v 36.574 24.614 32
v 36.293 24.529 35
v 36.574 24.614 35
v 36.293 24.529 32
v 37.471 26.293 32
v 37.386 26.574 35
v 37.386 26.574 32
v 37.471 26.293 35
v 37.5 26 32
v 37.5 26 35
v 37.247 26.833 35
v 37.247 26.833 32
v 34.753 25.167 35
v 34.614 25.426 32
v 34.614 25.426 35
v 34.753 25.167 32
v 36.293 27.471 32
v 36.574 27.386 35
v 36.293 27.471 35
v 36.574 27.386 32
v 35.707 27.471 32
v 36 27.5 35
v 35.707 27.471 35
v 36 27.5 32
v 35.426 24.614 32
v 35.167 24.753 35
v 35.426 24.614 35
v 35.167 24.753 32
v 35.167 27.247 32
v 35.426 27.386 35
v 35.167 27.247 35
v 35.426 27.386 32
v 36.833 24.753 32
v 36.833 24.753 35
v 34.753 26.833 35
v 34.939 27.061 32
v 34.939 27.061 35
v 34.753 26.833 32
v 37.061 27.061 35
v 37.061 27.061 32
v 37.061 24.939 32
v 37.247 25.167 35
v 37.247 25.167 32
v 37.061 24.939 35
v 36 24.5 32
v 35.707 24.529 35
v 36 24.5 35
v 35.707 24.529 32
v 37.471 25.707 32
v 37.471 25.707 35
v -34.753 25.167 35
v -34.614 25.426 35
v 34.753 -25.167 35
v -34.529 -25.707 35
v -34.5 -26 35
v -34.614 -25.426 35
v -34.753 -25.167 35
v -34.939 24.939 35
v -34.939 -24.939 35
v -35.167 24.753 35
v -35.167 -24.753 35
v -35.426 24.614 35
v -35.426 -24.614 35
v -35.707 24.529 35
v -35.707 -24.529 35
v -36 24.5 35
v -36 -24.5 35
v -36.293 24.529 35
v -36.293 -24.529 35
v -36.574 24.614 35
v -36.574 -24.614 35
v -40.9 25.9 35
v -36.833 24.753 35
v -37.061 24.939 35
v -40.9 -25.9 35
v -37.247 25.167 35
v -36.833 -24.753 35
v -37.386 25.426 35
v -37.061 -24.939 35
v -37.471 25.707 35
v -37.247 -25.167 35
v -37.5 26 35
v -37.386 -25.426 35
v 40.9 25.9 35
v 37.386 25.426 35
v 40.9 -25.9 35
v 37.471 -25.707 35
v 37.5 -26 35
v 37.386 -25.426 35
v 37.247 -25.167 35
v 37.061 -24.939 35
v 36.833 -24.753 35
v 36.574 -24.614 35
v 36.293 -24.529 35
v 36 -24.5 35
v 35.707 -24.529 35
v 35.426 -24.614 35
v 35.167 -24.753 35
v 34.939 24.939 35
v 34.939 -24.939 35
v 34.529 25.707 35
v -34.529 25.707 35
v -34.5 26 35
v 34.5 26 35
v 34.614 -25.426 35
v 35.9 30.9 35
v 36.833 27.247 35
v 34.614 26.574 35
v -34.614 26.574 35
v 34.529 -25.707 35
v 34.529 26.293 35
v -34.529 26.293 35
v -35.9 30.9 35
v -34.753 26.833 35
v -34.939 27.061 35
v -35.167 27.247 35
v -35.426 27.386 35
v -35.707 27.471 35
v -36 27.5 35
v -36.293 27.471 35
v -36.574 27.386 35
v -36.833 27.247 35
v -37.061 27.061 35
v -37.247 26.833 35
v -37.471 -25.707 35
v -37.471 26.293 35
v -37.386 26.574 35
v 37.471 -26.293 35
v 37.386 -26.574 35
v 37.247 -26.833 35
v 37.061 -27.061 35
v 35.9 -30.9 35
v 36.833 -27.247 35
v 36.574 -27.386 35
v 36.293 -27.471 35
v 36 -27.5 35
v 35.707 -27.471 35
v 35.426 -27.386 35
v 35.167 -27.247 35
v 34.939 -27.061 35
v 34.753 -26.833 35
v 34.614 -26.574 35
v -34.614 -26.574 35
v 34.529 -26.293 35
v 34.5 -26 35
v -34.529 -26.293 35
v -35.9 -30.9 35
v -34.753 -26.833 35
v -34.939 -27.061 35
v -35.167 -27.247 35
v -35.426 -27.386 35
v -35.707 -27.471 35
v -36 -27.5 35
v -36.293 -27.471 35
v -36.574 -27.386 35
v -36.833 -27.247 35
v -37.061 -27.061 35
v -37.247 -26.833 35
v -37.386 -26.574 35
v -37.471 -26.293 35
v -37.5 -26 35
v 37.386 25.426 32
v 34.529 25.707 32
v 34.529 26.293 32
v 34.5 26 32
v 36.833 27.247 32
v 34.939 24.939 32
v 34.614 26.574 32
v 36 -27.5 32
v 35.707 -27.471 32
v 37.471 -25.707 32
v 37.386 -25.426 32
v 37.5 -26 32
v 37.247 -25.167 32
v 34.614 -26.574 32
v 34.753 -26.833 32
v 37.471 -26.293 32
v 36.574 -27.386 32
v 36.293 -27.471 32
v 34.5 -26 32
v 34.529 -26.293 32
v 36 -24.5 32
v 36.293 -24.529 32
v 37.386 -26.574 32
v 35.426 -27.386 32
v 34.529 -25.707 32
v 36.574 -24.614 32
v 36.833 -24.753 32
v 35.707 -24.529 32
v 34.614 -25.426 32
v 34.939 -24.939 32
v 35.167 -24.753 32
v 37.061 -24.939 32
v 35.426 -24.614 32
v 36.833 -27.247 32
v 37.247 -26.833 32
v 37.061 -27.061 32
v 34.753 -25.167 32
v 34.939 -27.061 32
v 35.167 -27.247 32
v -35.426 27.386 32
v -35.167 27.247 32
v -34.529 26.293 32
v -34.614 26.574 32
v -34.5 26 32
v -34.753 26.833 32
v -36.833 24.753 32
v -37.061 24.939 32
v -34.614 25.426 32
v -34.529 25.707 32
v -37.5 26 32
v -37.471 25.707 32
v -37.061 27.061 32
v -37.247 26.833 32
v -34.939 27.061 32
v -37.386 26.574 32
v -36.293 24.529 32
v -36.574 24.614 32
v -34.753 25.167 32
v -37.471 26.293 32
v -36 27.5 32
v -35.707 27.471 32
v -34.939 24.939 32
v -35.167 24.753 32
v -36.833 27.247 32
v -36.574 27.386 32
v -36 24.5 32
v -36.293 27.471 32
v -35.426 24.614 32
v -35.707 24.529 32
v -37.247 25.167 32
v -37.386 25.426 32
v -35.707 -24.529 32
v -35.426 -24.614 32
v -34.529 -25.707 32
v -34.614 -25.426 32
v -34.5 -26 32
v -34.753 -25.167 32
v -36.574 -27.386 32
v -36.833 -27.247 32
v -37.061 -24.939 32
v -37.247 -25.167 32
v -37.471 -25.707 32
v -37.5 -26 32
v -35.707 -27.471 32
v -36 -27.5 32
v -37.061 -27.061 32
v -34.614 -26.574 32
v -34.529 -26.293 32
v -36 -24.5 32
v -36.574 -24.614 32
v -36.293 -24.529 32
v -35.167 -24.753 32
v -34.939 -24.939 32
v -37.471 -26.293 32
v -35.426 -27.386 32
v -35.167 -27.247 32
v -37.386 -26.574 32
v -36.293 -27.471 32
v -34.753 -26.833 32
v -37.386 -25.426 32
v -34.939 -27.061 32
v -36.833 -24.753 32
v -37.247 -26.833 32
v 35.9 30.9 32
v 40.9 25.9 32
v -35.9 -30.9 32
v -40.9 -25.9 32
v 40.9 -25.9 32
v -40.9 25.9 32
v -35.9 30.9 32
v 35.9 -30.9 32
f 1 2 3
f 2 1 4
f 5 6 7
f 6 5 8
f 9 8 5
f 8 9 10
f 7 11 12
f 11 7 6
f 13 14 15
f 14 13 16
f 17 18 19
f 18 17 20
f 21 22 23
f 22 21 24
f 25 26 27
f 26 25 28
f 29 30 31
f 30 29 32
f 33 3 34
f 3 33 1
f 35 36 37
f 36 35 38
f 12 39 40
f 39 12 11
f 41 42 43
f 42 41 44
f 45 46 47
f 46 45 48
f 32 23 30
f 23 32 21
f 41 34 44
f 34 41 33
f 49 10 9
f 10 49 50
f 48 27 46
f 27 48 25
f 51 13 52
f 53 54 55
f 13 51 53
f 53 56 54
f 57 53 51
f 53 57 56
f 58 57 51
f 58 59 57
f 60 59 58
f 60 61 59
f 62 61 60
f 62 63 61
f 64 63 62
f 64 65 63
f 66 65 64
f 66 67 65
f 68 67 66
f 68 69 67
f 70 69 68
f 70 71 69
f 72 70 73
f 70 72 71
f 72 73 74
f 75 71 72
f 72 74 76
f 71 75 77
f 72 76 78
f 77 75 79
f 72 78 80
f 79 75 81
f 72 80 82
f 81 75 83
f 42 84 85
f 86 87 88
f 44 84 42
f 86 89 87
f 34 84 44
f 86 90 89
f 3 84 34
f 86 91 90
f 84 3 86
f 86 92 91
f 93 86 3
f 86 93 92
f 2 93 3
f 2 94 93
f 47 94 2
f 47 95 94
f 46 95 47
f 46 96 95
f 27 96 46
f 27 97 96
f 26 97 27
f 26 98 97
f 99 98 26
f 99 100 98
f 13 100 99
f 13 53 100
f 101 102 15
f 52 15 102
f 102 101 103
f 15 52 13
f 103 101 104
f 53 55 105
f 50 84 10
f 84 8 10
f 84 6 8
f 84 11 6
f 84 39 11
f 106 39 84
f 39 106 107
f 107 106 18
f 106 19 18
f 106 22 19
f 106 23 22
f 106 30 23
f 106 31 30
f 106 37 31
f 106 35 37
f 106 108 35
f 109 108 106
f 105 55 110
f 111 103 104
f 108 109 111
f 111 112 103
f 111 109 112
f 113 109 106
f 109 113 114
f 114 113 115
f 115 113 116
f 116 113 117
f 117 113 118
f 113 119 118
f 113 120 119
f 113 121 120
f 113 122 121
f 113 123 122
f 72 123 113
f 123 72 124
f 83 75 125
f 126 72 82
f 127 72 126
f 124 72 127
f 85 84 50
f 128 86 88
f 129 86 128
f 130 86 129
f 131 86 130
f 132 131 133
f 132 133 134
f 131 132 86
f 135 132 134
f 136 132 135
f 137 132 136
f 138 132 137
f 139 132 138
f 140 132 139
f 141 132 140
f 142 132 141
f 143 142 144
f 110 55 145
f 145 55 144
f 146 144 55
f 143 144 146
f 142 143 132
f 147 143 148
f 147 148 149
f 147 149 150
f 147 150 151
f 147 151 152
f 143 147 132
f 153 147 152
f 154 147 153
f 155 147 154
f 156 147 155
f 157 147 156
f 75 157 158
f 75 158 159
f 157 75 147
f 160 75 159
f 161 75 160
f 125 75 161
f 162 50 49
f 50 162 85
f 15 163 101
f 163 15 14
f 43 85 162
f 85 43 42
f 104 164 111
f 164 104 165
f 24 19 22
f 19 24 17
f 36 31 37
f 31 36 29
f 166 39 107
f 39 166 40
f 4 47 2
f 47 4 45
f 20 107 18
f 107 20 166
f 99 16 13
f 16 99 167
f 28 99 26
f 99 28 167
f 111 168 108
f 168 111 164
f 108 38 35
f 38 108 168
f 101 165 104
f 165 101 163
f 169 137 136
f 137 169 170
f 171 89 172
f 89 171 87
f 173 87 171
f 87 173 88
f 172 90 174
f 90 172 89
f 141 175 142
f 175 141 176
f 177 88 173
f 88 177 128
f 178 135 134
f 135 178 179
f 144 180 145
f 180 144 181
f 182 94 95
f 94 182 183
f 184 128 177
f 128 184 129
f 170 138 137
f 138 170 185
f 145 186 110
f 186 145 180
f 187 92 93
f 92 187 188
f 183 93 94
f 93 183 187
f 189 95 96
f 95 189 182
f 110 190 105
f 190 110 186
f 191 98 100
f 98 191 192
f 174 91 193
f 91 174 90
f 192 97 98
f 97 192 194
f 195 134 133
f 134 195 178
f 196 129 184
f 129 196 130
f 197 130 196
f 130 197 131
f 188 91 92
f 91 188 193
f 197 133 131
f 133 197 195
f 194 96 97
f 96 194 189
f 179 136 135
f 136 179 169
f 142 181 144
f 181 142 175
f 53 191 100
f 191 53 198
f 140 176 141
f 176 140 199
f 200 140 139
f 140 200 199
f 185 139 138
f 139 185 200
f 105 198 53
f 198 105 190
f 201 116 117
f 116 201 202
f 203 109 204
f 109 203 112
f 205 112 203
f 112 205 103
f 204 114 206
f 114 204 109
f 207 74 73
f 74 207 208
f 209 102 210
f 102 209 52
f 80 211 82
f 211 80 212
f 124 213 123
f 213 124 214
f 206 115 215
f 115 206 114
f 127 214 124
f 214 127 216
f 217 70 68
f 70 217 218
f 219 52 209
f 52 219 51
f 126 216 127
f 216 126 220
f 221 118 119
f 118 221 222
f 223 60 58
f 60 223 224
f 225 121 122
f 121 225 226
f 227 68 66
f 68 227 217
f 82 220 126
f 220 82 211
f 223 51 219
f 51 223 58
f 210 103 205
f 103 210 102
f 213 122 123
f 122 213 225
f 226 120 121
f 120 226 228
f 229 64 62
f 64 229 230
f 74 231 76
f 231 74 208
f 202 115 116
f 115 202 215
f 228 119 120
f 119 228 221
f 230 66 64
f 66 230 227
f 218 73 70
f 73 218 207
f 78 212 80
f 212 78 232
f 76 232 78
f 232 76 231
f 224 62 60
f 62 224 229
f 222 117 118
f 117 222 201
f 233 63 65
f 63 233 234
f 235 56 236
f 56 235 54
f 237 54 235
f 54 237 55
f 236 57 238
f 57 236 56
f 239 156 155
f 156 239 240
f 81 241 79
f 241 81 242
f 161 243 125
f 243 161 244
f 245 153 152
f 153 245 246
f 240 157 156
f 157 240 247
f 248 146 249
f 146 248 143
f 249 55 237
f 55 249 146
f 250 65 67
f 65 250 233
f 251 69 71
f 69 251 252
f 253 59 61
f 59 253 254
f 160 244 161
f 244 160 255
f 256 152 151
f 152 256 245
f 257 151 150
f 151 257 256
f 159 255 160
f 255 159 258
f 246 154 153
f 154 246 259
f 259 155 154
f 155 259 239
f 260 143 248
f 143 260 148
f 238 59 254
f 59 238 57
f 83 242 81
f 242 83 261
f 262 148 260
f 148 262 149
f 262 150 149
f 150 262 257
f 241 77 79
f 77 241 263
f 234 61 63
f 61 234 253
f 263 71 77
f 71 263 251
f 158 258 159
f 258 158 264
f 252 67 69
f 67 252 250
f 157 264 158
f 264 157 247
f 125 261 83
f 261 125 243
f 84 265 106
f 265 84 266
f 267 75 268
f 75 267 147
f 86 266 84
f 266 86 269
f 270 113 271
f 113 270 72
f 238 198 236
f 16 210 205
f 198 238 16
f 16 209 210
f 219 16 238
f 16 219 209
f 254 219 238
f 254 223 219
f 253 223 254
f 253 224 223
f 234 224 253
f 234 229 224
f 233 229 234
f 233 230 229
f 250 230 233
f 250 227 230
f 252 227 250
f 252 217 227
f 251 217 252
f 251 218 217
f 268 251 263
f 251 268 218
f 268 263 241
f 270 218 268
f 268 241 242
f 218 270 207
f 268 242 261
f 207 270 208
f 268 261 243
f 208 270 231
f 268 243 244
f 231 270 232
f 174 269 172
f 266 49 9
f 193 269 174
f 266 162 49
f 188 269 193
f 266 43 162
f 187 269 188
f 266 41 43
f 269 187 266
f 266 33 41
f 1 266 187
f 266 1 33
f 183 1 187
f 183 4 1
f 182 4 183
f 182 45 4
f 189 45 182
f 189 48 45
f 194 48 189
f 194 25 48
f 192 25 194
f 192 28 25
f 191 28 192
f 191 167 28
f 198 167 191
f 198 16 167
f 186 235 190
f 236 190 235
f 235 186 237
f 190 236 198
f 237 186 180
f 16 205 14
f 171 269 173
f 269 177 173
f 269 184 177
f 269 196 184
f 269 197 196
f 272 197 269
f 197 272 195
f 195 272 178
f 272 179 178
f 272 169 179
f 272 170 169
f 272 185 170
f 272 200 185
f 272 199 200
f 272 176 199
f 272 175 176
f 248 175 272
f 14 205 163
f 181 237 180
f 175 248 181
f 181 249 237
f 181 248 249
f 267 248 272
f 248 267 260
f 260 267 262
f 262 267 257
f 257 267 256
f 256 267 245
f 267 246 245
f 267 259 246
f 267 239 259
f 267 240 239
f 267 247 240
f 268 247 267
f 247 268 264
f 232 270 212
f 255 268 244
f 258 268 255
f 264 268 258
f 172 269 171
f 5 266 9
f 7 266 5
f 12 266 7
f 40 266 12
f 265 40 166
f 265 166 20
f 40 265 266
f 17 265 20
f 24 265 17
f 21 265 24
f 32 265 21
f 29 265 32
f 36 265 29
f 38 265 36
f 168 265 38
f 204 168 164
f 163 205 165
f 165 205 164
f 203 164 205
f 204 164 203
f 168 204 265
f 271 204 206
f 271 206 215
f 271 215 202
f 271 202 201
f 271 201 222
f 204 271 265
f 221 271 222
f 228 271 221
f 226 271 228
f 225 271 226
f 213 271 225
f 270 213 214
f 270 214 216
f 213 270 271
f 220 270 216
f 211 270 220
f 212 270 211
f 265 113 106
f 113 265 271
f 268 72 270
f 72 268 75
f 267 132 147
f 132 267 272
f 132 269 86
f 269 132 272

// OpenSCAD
enclosure_inner_length = 80;
enclosure_inner_width = 60;
enclosure_inner_depth = 30;

enclosure_thickness = 2;

cover_thickness = 3;

part = "cover"; // [enclosure:Enclosure, cover:Cover, both:Enclosure and Cover]

print_part();

module print_part() {
	if (part == "enclosure") {
		box2(enclosure_inner_length,enclosure_inner_width,enclosure_inner_depth,enclosure_thickness,enclosure_thickness/2-0.10,cover_thickness);
	} else if (part == "cover") {
		lid2(enclosure_inner_length,enclosure_inner_width,enclosure_inner_depth,enclosure_thickness,enclosure_thickness/2+0.10,cover_thickness);
	} else {
		both();
	}
}

module both() {

	box2(enclosure_inner_length,enclosure_inner_width,enclosure_inner_depth,enclosure_thickness,enclosure_thickness/2-0.10,cover_thickness);
	lid2(enclosure_inner_length,enclosure_inner_width,enclosure_inner_depth,enclosure_thickness,enclosure_thickness/2+0.10,cover_thickness);

}

module screws(in_x, in_y, in_z, shell) {

	sx = in_x/2 - 4;
	sy = in_y/2 - 4;
	sh = shell + in_z - 12;
	nh = shell + in_z - 4;

	translate([0,0,0]) {
		translate([sx , sy, sh]) cylinder(r=1.5, h = 15, $fn=32);
		translate([sx , -sy, sh ]) cylinder(r=1.5, h = 15, $fn=32);
		translate([-sx , sy, sh ]) cylinder(r=1.5, h = 15, $fn=32);
		translate([-sx , -sy, sh ]) cylinder(r=1.5, h = 15, $fn=32);
	
	
		translate([-sx , -sy, nh ]) rotate([0,0,-45]) 
			translate([-5.75/2, -5.6/2, -0.7]) cube ([5.75, 10, 2.8]);
		translate([sx , -sy, nh ]) rotate([0,0,45]) 
			translate([-5.75/2, -5.6/2, -0.7]) cube ([5.75, 10, 2.8]);
		translate([sx , sy, nh ]) rotate([0,0,90+45]) 
			translate([-5.75/2, -5.6/2, -0.7]) cube ([5.75, 10, 2.8]);
		translate([-sx , sy, nh ]) rotate([0,0,-90-45]) 
			translate([-5.75/2, -5.6/2, -0.7]) cube ([5.75, 10, 2.8]);
	}
}

module bottom(in_x, in_y, in_z, shell) {

	hull() {
   	 	translate([-in_x/2+shell, -in_y/2+shell, 0]) cylinder(r=shell*2,h=shell, $fn=32);
		translate([+in_x/2-shell, -in_y/2+shell, 0]) cylinder(r=shell*2,h=shell, $fn=32);
		translate([+in_x/2-shell, in_y/2-shell, 0]) cylinder(r=shell*2,h=shell, $fn=32);
		translate([-in_x/2+shell, in_y/2-shell, 0]) cylinder(r=shell*2,h=shell, $fn=32);
	}
}

module sides(in_x, in_y, in_z, shell) {
	translate([0,0,shell])
	difference() {
		hull() {
	   	 	translate([-in_x/2+shell, -in_y/2+shell, 0]) cylinder(r=shell*2,h=in_z, $fn=32);
			translate([+in_x/2-shell, -in_y/2+shell, 0]) cylinder(r=shell*2,h=in_z, $fn=32);
			translate([+in_x/2-shell, in_y/2-shell, 0]) cylinder(r=shell*2,h=in_z, $fn=32);
			translate([-in_x/2+shell, in_y/2-shell, 0]) cylinder(r=shell*2,h=in_z, $fn=32);
		}
	
		hull() {
	   	 	translate([-in_x/2+shell, -in_y/2+shell, 0]) cylinder(r=shell,h=in_z+1, $fn=32);
			translate([+in_x/2-shell, -in_y/2+shell, 0]) cylinder(r=shell,h=in_z+1, $fn=32);
			translate([+in_x/2-shell, in_y/2-shell, 0]) cylinder(r=shell,h=in_z+1, $fn=32);
			translate([-in_x/2+shell, in_y/2-shell, 0]) cylinder(r=shell,h=in_z+1, $fn=32);
		}
	}
	
	intersection() {
		translate([-in_x/2, -in_y/2, shell]) cube([in_x, in_y, in_z+2]);
		union() {
			translate([-in_x/2 , -in_y/2,shell + in_z -6]) cylinder(r=9, h = 6, $fn=64);
			translate([-in_x/2 , -in_y/2,shell + in_z -10]) cylinder(r1=3, r2=9, h = 4, $fn=64);
		
			translate([in_x/2 , -in_y/2, shell + in_z -6]) cylinder(r=9, h = 6, $fn=64);
			translate([in_x/2 , -in_y/2, shell + in_z -10]) cylinder(r1=3, r2=9, h = 4, $fn=64);
		
			translate([in_x/2 , in_y/2,  shell + in_z -6]) cylinder(r=9, h = 6, $fn=64);
			translate([in_x/2 , in_y/2,  shell + in_z -10]) cylinder(r1=3, r2=9, h = 4, $fn=64);
		
			translate([-in_x/2 , in_y/2, shell + in_z -6]) cylinder(r=9, h = 6, $fn=64);
			translate([-in_x/2 , in_y/2, shell + in_z -10]) cylinder(r1=3, r2=9, h = 4, $fn=64);
		}
	}
}

module lid_top_lip2(in_x, in_y, in_z, shell, top_lip, top_thickness) {

	cxm = -in_x/2 - (shell-top_lip);
	cxp = in_x/2 + (shell-top_lip);
	cym = -in_y/2 - (shell-top_lip);
	cyp = in_y/2 + (shell-top_lip);

	translate([0,0,shell+in_z])

	difference() {
	
		hull() {
	   	 	translate([-in_x/2+shell, -in_y/2+shell, 0]) cylinder(r=shell*2,h=top_thickness, $fn=32);
			translate([+in_x/2-shell, -in_y/2+shell, 0]) cylinder(r=shell*2,h=top_thickness, $fn=32);
			translate([+in_x/2-shell, in_y/2-shell, 0]) cylinder(r=shell*2,h=top_thickness, $fn=32);
			translate([-in_x/2+shell, in_y/2-shell, 0]) cylinder(r=shell*2,h=top_thickness, $fn=32);
		}
	
		
		translate([0, 0, -1]) linear_extrude(height = top_thickness + 2) polygon(points = [
			[cxm+5, cym],
			[cxm, cym+5],
			[cxm, cyp-5],
			[cxm+5, cyp],
			[cxp-5, cyp],
			[cxp, cyp-5],
			[cxp, cym+5],
			[cxp-5, cym]]);
	}
}

module lid2(in_x, in_y, in_z, shell, top_lip, top_thickness) {

	cxm = -in_x/2 - (shell-top_lip);
	cxp = in_x/2 + (shell-top_lip);
	cym = -in_y/2 - (shell-top_lip);
	cyp = in_y/2 + (shell-top_lip);	

	difference() {
		translate([0, 0, in_z+shell]) linear_extrude(height = top_thickness ) polygon(points = [
			[cxm+5, cym],
			[cxm, cym+5],
			[cxm, cyp-5],
			[cxm+5, cyp],
			[cxp-5, cyp],
			[cxp, cyp-5],
			[cxp, cym+5],
			[cxp-5, cym]]);
	
			screws(in_x, in_y, in_z, shell);
	}
}

module box2(in_x, in_y, in_z, shell, top_lip, top_thickness) {
	bottom(in_x, in_y, in_z, shell);
	difference() {
		sides(in_x, in_y, in_z, shell);
		screws(in_x, in_y, in_z, shell);
		hole("length_1", 8, [0, 12]);
		hole("length_2", 6, [-10, 12]);
		hole("length_2", 6, [10, 12]);
	}
	lid_top_lip2(in_x, in_y, in_z, shell, top_lip, top_thickness);
}

module punch_hole(cylinder, rotate, translate_coords) {
	translate(translate_coords) rotate (rotate) cylinder (h = cylinder[1], r=cylinder[0], center = false, $fn=32);
}

module hole(side, radius, offset) {
	// side is "[length/width]_[1/2]"
	// radius is hole radius
	// offset is [horizontal, height] from the [center, bottom] of the side, or from the [center, center] of the lid.

	if (side == "length_1") {
		assign (
			rotate = [90,0,90], 
			translate_coords = [enclosure_thickness+1, offset[0], offset[1]], 
			length = enclosure_inner_length/2) {
				punch_hole([radius, length], rotate, translate_coords);
		}
	}
	if (side == "length_2") {
		assign (
			rotate = [90,0,270], 
			translate_coords = [-(enclosure_thickness+1), offset[0], offset[1]], 
			length = enclosure_inner_length/2) {
				punch_hole([radius, length], rotate, translate_coords);
		}
	}
	if (side == "width_1") {
		assign (
			rotate = [90,0,0], 
			translate_coords = [offset[0], -(enclosure_thickness+1), offset[1]], 
			length = enclosure_inner_width/2) {
				punch_hole([radius, length], rotate, translate_coords);
		}
	}
	if (side == "width_2") {
		assign (
			rotate = [90,0,180], 
			translate_coords = [offset[0], enclosure_thickness+1, offset[1]], 
			length = enclosure_inner_width/2) {
				punch_hole([radius, length], rotate, translate_coords);
		}
	}
	if (side == "lid") {
		assign (
			rotate = [0,0,0], 
			translate_coords = [offset[0], offset[1], enclosure_inner_depth-cover_thickness], 
			length = enclosure_inner_depth/2) {
				punch_hole([radius, length], rotate, translate_coords);
		}
	}
}
